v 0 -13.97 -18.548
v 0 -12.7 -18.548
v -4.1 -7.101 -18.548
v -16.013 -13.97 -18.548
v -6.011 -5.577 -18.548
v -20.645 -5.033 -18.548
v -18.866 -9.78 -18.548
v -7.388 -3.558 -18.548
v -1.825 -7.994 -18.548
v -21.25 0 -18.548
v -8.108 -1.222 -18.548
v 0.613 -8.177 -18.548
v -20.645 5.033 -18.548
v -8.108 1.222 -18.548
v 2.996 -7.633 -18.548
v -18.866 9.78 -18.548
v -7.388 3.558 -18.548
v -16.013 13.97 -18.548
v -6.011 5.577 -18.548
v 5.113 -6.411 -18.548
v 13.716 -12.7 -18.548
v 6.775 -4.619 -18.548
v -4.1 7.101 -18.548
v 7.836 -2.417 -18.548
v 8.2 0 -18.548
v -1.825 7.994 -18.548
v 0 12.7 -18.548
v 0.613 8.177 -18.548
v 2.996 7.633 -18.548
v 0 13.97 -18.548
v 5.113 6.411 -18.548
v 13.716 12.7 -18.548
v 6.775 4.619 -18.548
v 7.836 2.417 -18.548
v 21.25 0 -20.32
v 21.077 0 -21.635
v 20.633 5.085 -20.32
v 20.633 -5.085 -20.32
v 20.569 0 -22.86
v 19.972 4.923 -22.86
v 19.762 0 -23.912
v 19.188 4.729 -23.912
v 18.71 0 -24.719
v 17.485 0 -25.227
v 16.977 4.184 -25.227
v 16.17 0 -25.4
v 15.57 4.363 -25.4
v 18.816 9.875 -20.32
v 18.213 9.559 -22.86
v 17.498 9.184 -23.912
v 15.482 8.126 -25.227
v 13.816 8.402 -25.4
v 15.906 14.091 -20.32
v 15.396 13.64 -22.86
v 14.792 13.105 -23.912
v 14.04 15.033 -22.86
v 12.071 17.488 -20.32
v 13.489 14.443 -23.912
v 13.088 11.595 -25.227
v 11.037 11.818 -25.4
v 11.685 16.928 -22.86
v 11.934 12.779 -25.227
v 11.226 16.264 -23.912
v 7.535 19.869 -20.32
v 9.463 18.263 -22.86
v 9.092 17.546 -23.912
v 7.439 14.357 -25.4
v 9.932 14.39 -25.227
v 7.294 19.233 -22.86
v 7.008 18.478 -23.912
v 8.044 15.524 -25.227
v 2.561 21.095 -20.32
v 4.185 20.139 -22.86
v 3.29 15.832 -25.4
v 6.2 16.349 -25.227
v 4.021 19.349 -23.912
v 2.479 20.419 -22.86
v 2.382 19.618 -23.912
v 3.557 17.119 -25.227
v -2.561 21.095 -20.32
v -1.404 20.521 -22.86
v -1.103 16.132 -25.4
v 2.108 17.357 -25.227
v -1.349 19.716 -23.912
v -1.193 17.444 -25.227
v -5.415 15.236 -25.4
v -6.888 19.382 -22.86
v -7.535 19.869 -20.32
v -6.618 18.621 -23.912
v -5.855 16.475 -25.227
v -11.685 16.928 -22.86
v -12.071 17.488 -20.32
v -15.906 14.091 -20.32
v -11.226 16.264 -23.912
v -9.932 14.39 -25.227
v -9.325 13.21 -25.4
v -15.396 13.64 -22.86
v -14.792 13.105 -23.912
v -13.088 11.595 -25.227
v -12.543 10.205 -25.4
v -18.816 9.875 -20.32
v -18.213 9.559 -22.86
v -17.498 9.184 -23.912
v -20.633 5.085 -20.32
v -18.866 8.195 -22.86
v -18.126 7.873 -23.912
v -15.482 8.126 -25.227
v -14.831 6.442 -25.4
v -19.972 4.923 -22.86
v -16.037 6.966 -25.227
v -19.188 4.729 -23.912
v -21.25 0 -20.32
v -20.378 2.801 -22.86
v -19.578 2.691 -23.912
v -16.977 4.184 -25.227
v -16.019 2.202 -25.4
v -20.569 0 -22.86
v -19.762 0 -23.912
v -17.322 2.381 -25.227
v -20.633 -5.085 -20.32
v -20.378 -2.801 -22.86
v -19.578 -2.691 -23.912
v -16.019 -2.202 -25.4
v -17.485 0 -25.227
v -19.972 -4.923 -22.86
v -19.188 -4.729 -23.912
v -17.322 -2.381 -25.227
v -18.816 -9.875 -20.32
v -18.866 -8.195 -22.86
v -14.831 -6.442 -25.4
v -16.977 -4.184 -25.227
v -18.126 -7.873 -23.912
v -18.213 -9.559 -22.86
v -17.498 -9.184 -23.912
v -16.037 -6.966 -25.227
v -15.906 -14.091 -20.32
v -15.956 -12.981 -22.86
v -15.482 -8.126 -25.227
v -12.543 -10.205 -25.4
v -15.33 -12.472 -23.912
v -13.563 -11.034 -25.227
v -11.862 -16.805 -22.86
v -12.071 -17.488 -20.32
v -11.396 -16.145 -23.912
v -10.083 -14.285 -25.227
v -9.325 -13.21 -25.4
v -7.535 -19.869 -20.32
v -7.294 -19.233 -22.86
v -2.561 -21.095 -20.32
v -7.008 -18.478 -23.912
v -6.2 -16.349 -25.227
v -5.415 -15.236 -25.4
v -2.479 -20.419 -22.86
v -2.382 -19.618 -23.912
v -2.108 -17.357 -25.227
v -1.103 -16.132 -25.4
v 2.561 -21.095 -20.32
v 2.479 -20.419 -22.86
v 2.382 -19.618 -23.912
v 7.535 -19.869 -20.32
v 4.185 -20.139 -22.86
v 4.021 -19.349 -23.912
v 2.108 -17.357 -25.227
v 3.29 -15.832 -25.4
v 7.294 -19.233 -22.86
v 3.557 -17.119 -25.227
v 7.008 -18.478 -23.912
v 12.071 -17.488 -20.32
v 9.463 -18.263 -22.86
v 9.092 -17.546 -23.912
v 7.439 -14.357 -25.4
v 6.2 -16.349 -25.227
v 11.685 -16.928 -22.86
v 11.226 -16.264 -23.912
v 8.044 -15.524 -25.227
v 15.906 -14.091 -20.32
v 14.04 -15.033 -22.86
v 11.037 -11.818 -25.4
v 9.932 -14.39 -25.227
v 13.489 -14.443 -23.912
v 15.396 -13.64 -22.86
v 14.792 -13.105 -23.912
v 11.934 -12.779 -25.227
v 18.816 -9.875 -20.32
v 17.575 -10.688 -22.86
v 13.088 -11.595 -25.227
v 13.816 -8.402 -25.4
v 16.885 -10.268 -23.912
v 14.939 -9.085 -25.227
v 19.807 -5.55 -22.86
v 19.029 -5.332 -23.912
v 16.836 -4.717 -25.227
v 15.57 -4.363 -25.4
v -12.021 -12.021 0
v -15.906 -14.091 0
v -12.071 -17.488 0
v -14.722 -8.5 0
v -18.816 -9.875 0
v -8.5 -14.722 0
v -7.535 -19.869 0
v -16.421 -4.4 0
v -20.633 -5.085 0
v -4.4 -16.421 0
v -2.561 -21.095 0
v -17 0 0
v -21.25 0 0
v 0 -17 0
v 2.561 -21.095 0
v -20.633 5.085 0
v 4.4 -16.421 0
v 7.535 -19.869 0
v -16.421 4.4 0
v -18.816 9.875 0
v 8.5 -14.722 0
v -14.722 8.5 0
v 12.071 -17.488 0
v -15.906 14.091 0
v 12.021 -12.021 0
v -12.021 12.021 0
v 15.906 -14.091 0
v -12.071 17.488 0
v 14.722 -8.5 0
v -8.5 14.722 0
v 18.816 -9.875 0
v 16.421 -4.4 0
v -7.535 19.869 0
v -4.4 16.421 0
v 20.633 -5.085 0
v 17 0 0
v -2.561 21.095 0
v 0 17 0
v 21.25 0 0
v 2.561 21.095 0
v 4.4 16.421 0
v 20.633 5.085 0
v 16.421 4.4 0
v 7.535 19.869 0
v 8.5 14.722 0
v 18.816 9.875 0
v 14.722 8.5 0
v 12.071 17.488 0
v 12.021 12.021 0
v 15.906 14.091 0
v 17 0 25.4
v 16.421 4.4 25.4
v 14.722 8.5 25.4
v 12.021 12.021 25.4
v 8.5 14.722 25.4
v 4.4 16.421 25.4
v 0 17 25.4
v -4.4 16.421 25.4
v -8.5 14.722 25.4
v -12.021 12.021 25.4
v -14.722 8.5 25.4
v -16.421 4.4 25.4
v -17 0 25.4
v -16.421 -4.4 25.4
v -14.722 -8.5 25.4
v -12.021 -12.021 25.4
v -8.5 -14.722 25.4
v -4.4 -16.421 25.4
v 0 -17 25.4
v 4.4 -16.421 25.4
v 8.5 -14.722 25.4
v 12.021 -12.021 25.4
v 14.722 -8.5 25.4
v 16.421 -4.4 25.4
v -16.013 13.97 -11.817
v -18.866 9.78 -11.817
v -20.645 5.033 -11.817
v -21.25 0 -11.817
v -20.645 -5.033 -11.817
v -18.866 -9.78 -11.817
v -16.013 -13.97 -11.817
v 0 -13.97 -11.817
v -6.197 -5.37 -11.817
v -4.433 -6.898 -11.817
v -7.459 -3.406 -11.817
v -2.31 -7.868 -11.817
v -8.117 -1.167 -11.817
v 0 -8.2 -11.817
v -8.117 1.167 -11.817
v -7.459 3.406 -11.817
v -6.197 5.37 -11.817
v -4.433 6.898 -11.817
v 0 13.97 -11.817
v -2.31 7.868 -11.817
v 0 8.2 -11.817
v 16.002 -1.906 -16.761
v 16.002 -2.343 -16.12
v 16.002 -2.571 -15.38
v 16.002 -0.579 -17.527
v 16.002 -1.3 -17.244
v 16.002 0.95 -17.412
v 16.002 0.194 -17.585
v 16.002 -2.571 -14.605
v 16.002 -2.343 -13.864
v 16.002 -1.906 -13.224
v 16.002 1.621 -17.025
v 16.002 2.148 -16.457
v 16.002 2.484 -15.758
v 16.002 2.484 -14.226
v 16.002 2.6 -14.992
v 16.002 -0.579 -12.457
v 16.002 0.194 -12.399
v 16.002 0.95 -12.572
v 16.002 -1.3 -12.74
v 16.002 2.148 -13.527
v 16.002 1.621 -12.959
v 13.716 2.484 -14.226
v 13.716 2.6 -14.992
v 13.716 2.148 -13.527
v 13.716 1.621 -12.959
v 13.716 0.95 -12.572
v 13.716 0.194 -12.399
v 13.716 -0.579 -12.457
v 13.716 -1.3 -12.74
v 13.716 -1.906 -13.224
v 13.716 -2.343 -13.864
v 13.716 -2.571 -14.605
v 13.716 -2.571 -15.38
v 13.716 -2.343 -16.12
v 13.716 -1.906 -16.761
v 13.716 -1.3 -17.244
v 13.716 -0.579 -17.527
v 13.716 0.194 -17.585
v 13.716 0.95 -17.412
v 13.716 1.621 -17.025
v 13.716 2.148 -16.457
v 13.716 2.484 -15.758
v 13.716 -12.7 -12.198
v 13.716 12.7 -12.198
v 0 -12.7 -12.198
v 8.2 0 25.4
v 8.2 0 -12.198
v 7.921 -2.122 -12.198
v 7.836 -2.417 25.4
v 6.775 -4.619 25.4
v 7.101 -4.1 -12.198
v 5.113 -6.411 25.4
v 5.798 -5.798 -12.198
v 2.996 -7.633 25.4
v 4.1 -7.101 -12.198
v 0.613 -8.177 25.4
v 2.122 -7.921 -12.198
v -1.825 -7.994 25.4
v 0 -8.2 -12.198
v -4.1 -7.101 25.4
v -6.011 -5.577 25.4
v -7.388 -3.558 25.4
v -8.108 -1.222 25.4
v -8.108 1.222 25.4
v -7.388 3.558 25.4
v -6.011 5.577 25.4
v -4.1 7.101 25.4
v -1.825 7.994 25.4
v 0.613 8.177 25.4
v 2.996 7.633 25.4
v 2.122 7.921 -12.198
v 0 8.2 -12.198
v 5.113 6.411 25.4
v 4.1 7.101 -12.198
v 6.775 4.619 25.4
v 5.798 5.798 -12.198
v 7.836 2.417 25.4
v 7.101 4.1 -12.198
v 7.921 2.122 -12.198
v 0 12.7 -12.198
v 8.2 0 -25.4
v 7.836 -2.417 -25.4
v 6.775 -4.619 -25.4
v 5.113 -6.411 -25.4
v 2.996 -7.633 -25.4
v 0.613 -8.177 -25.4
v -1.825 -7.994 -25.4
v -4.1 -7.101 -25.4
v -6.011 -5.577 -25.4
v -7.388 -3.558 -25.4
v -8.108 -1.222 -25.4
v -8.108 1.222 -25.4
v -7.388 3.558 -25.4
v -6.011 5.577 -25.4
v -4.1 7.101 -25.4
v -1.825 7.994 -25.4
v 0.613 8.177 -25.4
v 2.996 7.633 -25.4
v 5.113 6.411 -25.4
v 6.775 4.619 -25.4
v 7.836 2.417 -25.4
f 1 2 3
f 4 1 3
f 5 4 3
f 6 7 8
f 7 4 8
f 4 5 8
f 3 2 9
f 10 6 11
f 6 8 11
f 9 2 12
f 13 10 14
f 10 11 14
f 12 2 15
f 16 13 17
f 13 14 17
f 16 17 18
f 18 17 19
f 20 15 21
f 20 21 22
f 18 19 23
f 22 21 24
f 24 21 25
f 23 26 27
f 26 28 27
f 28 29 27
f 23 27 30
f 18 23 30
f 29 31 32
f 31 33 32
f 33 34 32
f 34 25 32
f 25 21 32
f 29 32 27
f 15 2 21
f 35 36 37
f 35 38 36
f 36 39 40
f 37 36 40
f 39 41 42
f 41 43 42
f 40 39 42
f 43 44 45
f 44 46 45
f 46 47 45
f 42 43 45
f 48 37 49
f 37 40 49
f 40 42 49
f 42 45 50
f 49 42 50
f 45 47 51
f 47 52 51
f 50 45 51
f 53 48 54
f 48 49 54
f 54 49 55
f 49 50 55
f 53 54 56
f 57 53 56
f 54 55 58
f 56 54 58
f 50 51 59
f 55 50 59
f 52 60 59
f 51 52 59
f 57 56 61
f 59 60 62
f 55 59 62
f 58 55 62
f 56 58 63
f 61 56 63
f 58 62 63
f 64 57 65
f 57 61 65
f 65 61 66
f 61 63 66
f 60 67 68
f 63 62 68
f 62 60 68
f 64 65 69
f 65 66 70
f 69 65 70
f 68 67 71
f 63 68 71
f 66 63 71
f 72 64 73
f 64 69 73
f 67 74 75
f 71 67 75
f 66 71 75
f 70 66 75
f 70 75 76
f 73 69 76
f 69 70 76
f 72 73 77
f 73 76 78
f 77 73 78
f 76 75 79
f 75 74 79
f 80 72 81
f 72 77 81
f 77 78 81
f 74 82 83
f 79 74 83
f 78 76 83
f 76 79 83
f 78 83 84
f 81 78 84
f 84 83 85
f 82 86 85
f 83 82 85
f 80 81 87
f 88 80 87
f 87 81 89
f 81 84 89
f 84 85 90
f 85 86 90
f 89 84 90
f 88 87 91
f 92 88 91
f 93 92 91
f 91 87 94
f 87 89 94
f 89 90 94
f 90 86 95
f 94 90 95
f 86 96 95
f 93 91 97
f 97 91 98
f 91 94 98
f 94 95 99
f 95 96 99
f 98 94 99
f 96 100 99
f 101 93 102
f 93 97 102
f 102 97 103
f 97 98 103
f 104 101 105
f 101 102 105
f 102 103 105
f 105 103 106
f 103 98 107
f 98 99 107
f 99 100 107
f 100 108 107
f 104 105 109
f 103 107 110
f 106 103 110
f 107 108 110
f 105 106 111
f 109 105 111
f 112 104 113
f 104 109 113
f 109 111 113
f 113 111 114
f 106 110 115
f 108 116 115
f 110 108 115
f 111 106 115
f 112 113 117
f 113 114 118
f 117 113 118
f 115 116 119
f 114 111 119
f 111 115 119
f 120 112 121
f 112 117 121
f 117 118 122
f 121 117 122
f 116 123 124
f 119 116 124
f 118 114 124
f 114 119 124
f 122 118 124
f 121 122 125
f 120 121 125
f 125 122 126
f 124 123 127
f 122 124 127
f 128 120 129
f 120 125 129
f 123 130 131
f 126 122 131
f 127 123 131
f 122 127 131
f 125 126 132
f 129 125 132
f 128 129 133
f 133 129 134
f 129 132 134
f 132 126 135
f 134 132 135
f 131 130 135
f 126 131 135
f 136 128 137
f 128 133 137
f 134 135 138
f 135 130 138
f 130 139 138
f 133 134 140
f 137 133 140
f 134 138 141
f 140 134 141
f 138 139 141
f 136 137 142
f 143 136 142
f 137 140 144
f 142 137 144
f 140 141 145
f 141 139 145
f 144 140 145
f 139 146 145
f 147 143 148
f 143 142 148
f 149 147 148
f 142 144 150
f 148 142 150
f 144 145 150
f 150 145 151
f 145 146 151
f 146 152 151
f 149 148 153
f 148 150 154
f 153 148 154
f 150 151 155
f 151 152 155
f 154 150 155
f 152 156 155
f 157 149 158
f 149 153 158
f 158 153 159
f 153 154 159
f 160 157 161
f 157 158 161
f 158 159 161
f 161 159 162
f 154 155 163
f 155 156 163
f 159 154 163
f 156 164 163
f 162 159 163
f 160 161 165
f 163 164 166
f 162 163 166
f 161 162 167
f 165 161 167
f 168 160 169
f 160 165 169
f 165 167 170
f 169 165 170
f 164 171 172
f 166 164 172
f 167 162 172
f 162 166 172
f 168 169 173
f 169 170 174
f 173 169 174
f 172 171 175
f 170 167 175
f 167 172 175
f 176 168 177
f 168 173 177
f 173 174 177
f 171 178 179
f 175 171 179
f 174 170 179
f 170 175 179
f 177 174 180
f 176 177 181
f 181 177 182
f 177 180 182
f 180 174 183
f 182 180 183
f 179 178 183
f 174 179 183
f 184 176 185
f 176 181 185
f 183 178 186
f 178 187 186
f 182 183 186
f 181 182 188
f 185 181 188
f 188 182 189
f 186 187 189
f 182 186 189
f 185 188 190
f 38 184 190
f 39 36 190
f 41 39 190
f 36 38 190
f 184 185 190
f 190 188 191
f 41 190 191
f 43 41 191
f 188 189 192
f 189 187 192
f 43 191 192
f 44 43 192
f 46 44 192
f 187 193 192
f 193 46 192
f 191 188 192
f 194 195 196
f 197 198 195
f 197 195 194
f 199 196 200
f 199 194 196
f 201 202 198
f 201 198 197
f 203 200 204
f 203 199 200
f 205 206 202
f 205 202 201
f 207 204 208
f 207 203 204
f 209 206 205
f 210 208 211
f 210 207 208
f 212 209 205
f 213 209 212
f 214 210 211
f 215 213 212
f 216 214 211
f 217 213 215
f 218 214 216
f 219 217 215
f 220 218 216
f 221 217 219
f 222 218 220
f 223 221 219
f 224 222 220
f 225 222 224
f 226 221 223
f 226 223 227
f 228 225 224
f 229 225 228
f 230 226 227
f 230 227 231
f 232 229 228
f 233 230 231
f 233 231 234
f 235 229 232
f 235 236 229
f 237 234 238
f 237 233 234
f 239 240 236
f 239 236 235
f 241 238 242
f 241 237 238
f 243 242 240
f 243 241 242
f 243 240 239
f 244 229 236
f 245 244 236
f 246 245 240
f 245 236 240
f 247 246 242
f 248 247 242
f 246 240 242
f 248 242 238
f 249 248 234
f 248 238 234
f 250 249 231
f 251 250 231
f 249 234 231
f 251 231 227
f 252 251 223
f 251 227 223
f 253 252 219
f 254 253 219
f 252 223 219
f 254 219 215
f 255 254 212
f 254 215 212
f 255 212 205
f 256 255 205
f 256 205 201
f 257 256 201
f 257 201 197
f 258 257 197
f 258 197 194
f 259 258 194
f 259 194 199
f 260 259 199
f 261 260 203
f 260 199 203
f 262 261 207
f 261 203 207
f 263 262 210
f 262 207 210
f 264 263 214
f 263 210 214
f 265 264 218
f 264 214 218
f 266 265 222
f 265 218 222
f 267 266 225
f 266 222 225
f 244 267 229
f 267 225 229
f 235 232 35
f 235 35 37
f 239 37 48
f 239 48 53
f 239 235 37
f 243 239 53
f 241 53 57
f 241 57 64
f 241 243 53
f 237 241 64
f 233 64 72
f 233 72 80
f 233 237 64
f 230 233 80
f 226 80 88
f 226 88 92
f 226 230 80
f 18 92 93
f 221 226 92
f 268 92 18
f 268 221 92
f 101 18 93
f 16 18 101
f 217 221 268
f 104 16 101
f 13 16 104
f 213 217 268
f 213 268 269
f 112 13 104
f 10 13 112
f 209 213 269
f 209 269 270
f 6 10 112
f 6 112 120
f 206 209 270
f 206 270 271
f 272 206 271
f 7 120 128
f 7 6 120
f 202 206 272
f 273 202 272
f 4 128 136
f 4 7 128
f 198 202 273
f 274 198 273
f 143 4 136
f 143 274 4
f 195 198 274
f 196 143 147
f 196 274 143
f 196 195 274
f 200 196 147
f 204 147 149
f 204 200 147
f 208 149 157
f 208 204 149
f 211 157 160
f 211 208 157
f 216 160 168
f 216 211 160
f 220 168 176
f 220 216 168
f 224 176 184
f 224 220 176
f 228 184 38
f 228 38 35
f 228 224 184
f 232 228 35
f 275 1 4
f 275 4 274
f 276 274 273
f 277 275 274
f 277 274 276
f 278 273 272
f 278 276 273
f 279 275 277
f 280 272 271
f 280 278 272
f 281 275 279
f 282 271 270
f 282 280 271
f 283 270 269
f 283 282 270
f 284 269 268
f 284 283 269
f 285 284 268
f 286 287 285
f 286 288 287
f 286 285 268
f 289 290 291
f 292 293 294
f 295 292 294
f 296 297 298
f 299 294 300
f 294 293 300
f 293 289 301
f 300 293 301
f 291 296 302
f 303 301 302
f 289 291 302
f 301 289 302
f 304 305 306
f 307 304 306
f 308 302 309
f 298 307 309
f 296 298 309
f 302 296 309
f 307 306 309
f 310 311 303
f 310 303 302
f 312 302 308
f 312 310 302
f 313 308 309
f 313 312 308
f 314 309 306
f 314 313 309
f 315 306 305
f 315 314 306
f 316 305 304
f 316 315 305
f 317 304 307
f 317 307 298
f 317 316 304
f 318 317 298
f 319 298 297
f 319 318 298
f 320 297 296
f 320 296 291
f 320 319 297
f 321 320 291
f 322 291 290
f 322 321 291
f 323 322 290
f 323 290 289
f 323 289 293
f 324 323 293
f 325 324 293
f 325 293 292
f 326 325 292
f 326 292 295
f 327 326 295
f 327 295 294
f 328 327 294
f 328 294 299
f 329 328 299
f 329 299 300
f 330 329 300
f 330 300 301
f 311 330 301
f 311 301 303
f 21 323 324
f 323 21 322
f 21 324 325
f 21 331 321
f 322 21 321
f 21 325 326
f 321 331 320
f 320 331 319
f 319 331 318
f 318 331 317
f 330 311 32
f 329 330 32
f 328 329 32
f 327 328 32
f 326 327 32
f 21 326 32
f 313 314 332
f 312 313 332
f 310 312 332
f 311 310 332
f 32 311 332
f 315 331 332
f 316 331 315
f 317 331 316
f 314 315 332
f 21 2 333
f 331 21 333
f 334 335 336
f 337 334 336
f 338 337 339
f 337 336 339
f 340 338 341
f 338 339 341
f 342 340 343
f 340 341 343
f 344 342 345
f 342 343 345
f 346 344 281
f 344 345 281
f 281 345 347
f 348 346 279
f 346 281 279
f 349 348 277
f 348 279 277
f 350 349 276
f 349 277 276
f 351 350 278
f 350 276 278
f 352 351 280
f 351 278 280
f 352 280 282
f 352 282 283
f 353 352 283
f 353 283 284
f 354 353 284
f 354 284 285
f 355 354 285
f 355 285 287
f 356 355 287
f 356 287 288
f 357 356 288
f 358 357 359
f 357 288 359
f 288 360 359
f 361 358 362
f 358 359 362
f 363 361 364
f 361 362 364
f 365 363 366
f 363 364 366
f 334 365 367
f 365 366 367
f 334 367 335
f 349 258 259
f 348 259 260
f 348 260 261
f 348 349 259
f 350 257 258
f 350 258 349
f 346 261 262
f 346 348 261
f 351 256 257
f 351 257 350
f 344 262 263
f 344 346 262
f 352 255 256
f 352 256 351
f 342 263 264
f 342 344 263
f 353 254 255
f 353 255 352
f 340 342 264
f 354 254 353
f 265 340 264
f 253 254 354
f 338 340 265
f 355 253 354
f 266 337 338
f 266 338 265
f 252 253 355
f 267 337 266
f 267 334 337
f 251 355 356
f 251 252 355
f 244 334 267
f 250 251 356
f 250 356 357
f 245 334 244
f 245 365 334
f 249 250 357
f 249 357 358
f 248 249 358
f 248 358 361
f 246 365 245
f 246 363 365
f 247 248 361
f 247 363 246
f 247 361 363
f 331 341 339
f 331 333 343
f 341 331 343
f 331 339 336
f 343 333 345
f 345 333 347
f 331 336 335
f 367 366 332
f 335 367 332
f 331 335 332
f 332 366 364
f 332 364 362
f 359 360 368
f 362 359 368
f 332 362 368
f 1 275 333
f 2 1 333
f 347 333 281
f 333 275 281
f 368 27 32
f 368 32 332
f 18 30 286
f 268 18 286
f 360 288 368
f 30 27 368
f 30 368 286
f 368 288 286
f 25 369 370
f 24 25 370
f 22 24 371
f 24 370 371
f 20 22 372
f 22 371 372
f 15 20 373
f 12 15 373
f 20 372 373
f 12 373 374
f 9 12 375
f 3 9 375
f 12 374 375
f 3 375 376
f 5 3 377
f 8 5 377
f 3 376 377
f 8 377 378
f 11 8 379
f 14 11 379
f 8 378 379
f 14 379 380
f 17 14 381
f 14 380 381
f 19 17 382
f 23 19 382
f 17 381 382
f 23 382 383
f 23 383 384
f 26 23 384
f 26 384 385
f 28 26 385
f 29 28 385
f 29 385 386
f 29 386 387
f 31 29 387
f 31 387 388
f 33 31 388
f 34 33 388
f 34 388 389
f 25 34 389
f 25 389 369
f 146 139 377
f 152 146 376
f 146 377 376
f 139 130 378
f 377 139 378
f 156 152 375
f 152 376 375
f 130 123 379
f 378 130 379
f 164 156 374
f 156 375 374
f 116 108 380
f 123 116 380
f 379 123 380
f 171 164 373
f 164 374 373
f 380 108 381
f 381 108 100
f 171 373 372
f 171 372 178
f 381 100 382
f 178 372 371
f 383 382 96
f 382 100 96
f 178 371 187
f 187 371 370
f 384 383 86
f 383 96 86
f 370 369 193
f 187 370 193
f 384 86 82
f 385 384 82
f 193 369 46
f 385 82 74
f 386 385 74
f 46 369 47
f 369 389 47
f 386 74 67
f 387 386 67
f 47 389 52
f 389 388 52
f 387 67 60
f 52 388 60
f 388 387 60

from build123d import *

# Parameters (mm, degrees)
F0_R      = 17
F1_DEPTH  = 25.4
F2_R      = 21.25
F3_DEPTH  = 25.4
F4_R      = 8.2
F5_DEPTH  = 87.884
F6_W      = 27.94
F6_H      = 6.731
F7_DEPTH  = 25.4
F8_R      = 2.6
F9_DEPTH  = 16.002
F10_W     = 25.4
F10_H     = 6.35
F11_DEPTH = 13.716
F12_R     = 5.08


with BuildPart() as f1:
    # F0 (on Top) → F1 (new body)
    with BuildSketch(Plane.XY):
        Circle(F0_R)
    extrude(amount=F1_DEPTH)

    # F2 (on Top) → F3 (join)
    with BuildSketch(Plane.XY):
        Circle(F2_R)
    extrude(amount=-F3_DEPTH)

    # F4 (on face) → F5 (cut)
    with BuildSketch(Plane(origin=(0, 0, -25.4), x_dir=(1, 0, 0), z_dir=(0, 0, -1))):
        Circle(F4_R)
    extrude(amount=-F5_DEPTH, mode=Mode.SUBTRACT)

    # F6 (on Right) → F7 (cut)
    with BuildSketch(Plane.YZ):
        with Locations((0, -15.182626)):
            Rectangle(F6_W, F6_H)
    extrude(amount=-F7_DEPTH, mode=Mode.SUBTRACT)

    # F8 (on Right) → F9 (cut)
    with BuildSketch(Plane.YZ):
        with Locations((0, -14.992126)):
            Circle(F8_R)
    extrude(amount=F9_DEPTH, mode=Mode.SUBTRACT)

    # F10 (on Right) → F11 (cut)
    with BuildSketch(Plane.YZ):
        with Locations((0, -15.373126)):
            Rectangle(F10_W, F10_H)
    extrude(amount=F11_DEPTH, mode=Mode.SUBTRACT)

    # F12
    f12_edges = [f1.edges().sort_by_distance(p)[0] for p in [
        (-21.25, 0, -25.4),
    ]]
    fillet(f12_edges, radius=F12_R)


solid = f1.part
